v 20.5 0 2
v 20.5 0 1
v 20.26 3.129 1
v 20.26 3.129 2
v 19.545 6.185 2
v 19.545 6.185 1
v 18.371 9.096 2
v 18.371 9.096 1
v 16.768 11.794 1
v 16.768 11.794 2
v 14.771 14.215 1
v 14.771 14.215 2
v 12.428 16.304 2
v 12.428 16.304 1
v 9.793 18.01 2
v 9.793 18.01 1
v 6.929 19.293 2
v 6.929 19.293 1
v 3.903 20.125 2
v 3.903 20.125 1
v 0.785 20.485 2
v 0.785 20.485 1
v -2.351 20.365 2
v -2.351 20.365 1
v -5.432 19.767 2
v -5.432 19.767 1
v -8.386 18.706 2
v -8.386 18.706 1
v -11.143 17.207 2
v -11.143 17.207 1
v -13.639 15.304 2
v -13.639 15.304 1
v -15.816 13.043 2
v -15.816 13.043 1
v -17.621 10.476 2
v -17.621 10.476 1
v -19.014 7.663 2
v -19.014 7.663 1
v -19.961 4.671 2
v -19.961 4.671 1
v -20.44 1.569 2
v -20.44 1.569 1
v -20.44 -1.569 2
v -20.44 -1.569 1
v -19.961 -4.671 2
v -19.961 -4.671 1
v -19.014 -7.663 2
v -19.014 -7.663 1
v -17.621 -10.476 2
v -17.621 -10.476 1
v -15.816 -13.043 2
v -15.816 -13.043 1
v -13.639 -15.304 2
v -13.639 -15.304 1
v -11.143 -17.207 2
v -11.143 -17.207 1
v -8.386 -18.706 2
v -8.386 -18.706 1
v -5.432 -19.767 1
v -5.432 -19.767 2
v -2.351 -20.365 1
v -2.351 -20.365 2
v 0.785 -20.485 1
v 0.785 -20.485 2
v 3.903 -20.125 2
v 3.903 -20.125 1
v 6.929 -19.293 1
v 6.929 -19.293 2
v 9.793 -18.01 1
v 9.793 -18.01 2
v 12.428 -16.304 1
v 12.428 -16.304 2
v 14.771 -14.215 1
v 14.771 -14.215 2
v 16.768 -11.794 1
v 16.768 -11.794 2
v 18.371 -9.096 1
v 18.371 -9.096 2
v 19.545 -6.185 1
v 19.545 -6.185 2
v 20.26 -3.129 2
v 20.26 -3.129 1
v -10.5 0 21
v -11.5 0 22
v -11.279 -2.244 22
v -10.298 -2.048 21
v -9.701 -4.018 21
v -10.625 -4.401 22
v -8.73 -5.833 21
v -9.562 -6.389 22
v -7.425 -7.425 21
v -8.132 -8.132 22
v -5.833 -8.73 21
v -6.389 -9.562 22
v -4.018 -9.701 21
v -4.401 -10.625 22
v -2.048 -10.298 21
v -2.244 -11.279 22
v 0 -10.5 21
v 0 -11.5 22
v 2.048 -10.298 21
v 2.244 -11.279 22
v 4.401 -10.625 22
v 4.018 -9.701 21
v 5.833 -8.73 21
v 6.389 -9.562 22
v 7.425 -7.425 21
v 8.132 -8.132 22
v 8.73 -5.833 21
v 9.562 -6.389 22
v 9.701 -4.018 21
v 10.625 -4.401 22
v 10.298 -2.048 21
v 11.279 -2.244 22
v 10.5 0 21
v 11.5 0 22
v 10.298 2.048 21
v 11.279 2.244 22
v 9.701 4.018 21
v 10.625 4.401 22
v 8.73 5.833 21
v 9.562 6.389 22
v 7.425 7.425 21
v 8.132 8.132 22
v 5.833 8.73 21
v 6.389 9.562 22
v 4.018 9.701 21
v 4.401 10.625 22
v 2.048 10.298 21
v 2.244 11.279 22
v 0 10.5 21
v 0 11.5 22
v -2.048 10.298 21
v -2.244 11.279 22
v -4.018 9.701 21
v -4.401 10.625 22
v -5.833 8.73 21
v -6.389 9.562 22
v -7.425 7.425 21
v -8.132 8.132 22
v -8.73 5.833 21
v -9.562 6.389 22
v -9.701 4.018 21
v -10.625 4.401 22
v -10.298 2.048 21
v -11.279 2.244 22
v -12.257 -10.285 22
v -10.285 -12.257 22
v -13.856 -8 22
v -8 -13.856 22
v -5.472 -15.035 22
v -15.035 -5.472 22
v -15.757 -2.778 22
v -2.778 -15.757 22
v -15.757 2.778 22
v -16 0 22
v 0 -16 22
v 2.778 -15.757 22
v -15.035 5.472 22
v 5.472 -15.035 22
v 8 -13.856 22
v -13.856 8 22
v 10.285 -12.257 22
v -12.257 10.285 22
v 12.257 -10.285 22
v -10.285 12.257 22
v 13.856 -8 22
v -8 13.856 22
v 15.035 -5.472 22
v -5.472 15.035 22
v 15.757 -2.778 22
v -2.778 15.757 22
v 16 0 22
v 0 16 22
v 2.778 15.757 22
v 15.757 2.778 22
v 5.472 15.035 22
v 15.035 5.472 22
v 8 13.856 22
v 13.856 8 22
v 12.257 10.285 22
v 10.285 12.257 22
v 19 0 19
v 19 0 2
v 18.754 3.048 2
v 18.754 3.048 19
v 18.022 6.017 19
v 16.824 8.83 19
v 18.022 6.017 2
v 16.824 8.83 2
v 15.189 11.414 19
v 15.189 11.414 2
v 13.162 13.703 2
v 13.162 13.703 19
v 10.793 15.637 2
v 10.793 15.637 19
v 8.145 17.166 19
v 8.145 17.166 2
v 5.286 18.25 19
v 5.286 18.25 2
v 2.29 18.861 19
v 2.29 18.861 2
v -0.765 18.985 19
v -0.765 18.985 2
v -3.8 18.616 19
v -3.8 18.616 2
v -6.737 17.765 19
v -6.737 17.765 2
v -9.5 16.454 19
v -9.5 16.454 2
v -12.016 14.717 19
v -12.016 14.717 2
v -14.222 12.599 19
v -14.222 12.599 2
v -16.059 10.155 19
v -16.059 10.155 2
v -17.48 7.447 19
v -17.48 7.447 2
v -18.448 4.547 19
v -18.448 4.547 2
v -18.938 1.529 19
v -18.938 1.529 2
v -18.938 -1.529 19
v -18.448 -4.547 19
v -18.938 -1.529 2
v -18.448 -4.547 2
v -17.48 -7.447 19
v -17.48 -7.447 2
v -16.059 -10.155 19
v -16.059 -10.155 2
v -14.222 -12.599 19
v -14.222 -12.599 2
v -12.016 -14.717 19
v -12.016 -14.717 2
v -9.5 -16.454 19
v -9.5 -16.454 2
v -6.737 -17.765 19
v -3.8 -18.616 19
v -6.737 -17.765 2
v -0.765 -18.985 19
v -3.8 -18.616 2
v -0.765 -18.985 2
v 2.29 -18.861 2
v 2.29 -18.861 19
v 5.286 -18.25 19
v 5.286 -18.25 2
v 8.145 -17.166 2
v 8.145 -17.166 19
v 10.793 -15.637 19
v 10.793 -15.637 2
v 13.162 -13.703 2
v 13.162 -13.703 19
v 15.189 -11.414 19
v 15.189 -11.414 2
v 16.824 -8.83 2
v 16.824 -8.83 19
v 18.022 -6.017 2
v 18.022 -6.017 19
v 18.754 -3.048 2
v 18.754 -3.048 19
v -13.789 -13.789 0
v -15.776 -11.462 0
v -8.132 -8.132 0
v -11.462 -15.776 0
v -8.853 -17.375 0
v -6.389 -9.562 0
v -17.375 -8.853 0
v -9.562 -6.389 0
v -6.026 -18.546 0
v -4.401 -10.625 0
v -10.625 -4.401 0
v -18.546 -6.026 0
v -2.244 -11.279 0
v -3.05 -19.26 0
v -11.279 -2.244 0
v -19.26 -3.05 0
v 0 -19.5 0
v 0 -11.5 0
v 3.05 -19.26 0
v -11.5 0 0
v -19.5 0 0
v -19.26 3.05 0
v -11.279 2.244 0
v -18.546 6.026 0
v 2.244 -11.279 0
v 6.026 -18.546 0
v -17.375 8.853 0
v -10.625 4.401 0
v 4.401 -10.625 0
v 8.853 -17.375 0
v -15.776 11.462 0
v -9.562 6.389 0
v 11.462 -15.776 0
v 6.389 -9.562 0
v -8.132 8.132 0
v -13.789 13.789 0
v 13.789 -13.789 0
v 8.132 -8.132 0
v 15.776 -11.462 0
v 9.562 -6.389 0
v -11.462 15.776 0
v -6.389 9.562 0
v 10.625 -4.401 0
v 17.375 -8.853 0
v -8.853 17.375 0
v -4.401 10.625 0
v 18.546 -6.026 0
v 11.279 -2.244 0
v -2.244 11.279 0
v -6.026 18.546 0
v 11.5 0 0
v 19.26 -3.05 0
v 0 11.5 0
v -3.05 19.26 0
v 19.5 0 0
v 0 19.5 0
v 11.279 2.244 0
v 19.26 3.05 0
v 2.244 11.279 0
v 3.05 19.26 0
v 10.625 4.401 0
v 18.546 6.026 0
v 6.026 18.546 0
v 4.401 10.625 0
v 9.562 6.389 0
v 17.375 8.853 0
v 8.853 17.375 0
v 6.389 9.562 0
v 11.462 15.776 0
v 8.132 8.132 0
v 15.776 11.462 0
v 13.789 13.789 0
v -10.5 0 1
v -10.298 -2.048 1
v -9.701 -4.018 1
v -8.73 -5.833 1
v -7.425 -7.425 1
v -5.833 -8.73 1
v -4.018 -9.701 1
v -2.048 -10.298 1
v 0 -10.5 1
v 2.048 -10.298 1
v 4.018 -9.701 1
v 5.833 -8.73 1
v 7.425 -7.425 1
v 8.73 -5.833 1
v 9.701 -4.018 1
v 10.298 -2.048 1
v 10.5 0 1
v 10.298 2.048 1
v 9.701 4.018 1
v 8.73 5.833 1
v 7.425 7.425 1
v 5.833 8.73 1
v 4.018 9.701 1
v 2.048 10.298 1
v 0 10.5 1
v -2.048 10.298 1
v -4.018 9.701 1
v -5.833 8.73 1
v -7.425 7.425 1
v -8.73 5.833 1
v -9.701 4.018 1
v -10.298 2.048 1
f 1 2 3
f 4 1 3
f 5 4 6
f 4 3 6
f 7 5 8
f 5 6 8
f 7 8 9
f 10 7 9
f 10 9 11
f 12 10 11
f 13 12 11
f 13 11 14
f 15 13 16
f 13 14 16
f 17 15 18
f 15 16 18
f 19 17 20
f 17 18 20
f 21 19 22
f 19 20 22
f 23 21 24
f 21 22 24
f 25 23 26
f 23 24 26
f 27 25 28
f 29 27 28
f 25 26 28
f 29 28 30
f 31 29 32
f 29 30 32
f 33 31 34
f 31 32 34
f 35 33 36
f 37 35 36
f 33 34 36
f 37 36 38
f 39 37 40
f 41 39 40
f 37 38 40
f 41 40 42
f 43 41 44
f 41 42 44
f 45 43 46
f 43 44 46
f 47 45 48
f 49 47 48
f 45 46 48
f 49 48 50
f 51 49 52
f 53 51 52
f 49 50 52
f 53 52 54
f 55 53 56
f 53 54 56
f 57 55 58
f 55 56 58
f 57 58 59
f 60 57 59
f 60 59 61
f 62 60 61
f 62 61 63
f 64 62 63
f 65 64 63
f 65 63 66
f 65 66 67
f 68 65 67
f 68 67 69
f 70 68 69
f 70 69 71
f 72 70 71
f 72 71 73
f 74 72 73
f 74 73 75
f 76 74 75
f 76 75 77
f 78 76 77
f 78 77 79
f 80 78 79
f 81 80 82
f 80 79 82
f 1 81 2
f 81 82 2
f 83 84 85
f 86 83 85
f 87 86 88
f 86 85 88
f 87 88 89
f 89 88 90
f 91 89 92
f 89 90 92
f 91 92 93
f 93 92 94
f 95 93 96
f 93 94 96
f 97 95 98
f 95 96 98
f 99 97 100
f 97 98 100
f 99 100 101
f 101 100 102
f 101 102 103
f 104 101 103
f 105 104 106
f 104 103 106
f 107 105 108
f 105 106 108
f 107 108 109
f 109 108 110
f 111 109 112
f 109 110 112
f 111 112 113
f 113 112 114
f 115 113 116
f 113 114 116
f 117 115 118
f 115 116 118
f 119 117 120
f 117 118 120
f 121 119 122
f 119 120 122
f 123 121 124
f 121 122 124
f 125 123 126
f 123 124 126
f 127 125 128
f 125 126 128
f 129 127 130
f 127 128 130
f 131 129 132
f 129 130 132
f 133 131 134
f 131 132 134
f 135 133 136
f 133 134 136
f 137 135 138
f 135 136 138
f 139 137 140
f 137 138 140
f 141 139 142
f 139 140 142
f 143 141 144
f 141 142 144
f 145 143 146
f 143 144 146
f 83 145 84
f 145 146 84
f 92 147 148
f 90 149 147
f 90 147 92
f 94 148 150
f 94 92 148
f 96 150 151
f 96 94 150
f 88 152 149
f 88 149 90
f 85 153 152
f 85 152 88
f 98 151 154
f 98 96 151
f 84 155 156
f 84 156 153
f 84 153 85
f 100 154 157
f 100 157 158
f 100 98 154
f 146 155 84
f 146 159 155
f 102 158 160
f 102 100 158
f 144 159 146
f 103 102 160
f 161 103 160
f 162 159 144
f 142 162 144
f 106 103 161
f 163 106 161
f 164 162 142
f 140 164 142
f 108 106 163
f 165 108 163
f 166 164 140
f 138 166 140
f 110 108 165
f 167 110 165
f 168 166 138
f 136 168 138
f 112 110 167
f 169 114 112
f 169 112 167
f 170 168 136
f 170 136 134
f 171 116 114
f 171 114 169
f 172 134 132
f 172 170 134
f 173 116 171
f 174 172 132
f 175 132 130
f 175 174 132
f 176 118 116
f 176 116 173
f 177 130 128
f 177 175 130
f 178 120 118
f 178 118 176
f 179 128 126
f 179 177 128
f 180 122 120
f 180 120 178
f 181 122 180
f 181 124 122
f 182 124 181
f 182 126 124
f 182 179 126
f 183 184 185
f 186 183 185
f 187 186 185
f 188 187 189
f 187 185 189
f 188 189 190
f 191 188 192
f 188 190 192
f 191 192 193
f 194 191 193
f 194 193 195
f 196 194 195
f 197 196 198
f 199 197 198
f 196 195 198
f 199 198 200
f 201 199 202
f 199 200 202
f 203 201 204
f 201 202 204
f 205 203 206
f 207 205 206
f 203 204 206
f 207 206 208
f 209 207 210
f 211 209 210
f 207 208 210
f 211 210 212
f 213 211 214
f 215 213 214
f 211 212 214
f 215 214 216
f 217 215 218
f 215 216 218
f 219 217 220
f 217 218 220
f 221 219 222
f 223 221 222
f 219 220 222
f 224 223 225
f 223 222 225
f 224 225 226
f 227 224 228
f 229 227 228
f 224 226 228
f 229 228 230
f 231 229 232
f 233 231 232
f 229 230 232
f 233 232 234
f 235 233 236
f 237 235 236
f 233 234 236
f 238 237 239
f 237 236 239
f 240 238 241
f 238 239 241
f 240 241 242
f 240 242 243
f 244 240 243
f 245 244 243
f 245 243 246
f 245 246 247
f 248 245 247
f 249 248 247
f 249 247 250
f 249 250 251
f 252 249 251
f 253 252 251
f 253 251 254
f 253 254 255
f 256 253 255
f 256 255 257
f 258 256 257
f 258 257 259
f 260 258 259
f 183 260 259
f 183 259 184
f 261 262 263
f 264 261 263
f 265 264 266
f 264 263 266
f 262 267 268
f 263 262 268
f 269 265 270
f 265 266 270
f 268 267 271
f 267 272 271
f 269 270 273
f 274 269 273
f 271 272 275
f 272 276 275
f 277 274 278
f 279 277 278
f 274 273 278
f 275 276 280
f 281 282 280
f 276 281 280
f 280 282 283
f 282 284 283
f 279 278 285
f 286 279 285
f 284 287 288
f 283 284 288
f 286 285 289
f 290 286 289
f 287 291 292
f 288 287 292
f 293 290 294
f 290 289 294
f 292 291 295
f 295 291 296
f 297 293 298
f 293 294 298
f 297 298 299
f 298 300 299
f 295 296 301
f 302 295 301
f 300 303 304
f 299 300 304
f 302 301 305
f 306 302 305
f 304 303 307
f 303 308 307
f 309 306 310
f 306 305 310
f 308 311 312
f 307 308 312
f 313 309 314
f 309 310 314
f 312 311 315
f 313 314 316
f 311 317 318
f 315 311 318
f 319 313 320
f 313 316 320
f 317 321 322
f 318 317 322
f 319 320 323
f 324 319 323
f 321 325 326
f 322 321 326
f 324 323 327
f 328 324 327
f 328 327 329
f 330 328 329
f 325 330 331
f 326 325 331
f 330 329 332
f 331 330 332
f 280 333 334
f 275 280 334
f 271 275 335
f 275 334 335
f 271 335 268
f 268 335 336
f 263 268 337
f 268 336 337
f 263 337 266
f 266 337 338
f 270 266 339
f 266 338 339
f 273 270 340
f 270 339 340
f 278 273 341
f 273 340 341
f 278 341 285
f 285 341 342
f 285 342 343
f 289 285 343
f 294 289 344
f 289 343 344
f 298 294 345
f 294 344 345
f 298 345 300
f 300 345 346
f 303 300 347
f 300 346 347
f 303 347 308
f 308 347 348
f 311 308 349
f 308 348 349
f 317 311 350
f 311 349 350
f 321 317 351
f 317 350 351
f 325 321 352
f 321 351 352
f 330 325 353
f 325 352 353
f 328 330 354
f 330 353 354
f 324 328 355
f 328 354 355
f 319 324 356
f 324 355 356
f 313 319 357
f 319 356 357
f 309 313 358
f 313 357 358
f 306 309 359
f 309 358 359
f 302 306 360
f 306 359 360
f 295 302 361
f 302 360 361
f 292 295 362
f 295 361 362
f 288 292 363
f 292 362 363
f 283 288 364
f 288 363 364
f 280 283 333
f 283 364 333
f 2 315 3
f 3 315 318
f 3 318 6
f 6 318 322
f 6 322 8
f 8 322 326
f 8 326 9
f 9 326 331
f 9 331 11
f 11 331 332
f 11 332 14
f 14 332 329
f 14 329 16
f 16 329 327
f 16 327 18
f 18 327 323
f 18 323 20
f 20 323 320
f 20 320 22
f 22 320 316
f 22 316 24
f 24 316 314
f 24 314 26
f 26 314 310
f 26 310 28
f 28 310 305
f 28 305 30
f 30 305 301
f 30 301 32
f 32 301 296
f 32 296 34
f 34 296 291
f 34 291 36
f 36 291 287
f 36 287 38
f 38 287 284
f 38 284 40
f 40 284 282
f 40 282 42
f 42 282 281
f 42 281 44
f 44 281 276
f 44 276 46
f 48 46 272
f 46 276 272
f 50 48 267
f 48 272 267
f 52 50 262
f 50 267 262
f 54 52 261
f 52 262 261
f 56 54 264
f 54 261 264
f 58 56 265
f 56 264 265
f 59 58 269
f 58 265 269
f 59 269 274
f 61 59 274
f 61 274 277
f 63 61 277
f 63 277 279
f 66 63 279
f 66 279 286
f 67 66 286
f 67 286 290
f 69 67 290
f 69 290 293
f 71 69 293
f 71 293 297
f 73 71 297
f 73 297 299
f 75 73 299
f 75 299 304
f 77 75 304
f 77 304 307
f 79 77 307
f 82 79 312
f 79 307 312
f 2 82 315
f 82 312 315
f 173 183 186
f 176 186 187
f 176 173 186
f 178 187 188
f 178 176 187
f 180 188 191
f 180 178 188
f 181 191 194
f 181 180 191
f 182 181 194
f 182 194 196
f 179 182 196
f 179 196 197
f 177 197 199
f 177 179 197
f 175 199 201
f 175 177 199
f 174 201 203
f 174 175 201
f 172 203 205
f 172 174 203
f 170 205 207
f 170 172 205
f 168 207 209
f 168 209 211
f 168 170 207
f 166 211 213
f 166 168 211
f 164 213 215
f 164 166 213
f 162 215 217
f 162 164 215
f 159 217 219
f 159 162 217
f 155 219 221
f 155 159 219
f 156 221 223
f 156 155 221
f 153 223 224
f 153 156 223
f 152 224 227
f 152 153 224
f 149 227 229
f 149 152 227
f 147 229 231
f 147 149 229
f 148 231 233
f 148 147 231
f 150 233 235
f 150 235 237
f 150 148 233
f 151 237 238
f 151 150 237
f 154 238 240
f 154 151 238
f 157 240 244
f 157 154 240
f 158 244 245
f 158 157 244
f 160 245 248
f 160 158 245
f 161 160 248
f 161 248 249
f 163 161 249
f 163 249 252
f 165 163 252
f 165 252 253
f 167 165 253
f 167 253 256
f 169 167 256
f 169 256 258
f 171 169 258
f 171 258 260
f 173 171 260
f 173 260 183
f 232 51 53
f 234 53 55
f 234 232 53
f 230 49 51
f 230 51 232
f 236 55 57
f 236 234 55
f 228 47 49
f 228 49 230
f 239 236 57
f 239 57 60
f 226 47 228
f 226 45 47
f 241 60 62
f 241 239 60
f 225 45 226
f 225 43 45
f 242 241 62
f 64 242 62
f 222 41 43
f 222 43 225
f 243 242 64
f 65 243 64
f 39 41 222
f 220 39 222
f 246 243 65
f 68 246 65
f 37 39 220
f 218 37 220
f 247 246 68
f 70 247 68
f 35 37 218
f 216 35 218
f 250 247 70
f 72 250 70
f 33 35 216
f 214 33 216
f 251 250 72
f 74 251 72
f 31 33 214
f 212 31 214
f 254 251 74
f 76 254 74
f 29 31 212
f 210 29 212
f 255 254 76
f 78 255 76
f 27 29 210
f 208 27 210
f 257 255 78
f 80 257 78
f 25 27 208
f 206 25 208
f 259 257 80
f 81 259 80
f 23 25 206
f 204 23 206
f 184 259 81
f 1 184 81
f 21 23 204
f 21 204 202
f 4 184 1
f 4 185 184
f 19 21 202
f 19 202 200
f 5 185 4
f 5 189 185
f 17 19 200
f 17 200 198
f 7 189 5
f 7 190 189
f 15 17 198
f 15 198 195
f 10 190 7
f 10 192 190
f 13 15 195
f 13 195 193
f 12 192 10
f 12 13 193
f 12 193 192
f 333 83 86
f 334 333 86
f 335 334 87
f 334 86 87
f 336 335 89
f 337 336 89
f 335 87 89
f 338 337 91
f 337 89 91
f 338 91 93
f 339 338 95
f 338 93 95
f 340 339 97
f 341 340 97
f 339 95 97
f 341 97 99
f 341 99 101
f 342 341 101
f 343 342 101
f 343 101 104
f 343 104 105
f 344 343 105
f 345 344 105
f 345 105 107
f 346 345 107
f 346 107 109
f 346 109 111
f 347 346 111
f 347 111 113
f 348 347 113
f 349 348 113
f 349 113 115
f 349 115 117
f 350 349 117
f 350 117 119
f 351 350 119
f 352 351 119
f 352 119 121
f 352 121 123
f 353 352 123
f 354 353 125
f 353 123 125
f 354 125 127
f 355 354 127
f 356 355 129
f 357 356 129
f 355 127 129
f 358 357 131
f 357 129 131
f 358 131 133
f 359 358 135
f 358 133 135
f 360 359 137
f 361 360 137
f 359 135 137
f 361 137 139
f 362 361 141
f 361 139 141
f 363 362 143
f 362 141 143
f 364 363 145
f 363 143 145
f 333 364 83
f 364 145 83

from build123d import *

# Parameters (mm, degrees)
F0_R     = 20.5
F1_DEPTH = 2
F2_R     = 19
F3_DEPTH = 20
F4_D     = 21
F5_SIZE  = 1
F6_SIZE  = 3


with BuildPart() as f1:
    # F0 (on Top) → F1 (new body)
    with BuildSketch(Plane.XY):
        Circle(F0_R)
    extrude(amount=F1_DEPTH)

    # F2 (on face) → F3 (join)
    with BuildSketch(Plane.XY.offset(2)):
        Circle(F2_R)
    extrude(amount=F3_DEPTH)

    # F4 (through all)
    with Locations(Plane(origin=(0, 0, 0), x_dir=(1, 0, 0), z_dir=(0, 0, -1))):
        with Locations((0, 0)):
            Hole(F4_D / 2)

    # F5
    f5_edges = [f1.edges().sort_by_distance(p)[0] for p in [
        (-20.5, 0, 0),
        (-10.5, 0, 0),
        (-10.5, 0, 22),
    ]]
    chamfer(f5_edges, length=F5_SIZE)

    # F6
    f6_edges = [f1.edges().sort_by_distance(p)[0] for p in [
        (-19, 0, 22),
    ]]
    chamfer(f6_edges, length=F6_SIZE)


solid = f1.part
